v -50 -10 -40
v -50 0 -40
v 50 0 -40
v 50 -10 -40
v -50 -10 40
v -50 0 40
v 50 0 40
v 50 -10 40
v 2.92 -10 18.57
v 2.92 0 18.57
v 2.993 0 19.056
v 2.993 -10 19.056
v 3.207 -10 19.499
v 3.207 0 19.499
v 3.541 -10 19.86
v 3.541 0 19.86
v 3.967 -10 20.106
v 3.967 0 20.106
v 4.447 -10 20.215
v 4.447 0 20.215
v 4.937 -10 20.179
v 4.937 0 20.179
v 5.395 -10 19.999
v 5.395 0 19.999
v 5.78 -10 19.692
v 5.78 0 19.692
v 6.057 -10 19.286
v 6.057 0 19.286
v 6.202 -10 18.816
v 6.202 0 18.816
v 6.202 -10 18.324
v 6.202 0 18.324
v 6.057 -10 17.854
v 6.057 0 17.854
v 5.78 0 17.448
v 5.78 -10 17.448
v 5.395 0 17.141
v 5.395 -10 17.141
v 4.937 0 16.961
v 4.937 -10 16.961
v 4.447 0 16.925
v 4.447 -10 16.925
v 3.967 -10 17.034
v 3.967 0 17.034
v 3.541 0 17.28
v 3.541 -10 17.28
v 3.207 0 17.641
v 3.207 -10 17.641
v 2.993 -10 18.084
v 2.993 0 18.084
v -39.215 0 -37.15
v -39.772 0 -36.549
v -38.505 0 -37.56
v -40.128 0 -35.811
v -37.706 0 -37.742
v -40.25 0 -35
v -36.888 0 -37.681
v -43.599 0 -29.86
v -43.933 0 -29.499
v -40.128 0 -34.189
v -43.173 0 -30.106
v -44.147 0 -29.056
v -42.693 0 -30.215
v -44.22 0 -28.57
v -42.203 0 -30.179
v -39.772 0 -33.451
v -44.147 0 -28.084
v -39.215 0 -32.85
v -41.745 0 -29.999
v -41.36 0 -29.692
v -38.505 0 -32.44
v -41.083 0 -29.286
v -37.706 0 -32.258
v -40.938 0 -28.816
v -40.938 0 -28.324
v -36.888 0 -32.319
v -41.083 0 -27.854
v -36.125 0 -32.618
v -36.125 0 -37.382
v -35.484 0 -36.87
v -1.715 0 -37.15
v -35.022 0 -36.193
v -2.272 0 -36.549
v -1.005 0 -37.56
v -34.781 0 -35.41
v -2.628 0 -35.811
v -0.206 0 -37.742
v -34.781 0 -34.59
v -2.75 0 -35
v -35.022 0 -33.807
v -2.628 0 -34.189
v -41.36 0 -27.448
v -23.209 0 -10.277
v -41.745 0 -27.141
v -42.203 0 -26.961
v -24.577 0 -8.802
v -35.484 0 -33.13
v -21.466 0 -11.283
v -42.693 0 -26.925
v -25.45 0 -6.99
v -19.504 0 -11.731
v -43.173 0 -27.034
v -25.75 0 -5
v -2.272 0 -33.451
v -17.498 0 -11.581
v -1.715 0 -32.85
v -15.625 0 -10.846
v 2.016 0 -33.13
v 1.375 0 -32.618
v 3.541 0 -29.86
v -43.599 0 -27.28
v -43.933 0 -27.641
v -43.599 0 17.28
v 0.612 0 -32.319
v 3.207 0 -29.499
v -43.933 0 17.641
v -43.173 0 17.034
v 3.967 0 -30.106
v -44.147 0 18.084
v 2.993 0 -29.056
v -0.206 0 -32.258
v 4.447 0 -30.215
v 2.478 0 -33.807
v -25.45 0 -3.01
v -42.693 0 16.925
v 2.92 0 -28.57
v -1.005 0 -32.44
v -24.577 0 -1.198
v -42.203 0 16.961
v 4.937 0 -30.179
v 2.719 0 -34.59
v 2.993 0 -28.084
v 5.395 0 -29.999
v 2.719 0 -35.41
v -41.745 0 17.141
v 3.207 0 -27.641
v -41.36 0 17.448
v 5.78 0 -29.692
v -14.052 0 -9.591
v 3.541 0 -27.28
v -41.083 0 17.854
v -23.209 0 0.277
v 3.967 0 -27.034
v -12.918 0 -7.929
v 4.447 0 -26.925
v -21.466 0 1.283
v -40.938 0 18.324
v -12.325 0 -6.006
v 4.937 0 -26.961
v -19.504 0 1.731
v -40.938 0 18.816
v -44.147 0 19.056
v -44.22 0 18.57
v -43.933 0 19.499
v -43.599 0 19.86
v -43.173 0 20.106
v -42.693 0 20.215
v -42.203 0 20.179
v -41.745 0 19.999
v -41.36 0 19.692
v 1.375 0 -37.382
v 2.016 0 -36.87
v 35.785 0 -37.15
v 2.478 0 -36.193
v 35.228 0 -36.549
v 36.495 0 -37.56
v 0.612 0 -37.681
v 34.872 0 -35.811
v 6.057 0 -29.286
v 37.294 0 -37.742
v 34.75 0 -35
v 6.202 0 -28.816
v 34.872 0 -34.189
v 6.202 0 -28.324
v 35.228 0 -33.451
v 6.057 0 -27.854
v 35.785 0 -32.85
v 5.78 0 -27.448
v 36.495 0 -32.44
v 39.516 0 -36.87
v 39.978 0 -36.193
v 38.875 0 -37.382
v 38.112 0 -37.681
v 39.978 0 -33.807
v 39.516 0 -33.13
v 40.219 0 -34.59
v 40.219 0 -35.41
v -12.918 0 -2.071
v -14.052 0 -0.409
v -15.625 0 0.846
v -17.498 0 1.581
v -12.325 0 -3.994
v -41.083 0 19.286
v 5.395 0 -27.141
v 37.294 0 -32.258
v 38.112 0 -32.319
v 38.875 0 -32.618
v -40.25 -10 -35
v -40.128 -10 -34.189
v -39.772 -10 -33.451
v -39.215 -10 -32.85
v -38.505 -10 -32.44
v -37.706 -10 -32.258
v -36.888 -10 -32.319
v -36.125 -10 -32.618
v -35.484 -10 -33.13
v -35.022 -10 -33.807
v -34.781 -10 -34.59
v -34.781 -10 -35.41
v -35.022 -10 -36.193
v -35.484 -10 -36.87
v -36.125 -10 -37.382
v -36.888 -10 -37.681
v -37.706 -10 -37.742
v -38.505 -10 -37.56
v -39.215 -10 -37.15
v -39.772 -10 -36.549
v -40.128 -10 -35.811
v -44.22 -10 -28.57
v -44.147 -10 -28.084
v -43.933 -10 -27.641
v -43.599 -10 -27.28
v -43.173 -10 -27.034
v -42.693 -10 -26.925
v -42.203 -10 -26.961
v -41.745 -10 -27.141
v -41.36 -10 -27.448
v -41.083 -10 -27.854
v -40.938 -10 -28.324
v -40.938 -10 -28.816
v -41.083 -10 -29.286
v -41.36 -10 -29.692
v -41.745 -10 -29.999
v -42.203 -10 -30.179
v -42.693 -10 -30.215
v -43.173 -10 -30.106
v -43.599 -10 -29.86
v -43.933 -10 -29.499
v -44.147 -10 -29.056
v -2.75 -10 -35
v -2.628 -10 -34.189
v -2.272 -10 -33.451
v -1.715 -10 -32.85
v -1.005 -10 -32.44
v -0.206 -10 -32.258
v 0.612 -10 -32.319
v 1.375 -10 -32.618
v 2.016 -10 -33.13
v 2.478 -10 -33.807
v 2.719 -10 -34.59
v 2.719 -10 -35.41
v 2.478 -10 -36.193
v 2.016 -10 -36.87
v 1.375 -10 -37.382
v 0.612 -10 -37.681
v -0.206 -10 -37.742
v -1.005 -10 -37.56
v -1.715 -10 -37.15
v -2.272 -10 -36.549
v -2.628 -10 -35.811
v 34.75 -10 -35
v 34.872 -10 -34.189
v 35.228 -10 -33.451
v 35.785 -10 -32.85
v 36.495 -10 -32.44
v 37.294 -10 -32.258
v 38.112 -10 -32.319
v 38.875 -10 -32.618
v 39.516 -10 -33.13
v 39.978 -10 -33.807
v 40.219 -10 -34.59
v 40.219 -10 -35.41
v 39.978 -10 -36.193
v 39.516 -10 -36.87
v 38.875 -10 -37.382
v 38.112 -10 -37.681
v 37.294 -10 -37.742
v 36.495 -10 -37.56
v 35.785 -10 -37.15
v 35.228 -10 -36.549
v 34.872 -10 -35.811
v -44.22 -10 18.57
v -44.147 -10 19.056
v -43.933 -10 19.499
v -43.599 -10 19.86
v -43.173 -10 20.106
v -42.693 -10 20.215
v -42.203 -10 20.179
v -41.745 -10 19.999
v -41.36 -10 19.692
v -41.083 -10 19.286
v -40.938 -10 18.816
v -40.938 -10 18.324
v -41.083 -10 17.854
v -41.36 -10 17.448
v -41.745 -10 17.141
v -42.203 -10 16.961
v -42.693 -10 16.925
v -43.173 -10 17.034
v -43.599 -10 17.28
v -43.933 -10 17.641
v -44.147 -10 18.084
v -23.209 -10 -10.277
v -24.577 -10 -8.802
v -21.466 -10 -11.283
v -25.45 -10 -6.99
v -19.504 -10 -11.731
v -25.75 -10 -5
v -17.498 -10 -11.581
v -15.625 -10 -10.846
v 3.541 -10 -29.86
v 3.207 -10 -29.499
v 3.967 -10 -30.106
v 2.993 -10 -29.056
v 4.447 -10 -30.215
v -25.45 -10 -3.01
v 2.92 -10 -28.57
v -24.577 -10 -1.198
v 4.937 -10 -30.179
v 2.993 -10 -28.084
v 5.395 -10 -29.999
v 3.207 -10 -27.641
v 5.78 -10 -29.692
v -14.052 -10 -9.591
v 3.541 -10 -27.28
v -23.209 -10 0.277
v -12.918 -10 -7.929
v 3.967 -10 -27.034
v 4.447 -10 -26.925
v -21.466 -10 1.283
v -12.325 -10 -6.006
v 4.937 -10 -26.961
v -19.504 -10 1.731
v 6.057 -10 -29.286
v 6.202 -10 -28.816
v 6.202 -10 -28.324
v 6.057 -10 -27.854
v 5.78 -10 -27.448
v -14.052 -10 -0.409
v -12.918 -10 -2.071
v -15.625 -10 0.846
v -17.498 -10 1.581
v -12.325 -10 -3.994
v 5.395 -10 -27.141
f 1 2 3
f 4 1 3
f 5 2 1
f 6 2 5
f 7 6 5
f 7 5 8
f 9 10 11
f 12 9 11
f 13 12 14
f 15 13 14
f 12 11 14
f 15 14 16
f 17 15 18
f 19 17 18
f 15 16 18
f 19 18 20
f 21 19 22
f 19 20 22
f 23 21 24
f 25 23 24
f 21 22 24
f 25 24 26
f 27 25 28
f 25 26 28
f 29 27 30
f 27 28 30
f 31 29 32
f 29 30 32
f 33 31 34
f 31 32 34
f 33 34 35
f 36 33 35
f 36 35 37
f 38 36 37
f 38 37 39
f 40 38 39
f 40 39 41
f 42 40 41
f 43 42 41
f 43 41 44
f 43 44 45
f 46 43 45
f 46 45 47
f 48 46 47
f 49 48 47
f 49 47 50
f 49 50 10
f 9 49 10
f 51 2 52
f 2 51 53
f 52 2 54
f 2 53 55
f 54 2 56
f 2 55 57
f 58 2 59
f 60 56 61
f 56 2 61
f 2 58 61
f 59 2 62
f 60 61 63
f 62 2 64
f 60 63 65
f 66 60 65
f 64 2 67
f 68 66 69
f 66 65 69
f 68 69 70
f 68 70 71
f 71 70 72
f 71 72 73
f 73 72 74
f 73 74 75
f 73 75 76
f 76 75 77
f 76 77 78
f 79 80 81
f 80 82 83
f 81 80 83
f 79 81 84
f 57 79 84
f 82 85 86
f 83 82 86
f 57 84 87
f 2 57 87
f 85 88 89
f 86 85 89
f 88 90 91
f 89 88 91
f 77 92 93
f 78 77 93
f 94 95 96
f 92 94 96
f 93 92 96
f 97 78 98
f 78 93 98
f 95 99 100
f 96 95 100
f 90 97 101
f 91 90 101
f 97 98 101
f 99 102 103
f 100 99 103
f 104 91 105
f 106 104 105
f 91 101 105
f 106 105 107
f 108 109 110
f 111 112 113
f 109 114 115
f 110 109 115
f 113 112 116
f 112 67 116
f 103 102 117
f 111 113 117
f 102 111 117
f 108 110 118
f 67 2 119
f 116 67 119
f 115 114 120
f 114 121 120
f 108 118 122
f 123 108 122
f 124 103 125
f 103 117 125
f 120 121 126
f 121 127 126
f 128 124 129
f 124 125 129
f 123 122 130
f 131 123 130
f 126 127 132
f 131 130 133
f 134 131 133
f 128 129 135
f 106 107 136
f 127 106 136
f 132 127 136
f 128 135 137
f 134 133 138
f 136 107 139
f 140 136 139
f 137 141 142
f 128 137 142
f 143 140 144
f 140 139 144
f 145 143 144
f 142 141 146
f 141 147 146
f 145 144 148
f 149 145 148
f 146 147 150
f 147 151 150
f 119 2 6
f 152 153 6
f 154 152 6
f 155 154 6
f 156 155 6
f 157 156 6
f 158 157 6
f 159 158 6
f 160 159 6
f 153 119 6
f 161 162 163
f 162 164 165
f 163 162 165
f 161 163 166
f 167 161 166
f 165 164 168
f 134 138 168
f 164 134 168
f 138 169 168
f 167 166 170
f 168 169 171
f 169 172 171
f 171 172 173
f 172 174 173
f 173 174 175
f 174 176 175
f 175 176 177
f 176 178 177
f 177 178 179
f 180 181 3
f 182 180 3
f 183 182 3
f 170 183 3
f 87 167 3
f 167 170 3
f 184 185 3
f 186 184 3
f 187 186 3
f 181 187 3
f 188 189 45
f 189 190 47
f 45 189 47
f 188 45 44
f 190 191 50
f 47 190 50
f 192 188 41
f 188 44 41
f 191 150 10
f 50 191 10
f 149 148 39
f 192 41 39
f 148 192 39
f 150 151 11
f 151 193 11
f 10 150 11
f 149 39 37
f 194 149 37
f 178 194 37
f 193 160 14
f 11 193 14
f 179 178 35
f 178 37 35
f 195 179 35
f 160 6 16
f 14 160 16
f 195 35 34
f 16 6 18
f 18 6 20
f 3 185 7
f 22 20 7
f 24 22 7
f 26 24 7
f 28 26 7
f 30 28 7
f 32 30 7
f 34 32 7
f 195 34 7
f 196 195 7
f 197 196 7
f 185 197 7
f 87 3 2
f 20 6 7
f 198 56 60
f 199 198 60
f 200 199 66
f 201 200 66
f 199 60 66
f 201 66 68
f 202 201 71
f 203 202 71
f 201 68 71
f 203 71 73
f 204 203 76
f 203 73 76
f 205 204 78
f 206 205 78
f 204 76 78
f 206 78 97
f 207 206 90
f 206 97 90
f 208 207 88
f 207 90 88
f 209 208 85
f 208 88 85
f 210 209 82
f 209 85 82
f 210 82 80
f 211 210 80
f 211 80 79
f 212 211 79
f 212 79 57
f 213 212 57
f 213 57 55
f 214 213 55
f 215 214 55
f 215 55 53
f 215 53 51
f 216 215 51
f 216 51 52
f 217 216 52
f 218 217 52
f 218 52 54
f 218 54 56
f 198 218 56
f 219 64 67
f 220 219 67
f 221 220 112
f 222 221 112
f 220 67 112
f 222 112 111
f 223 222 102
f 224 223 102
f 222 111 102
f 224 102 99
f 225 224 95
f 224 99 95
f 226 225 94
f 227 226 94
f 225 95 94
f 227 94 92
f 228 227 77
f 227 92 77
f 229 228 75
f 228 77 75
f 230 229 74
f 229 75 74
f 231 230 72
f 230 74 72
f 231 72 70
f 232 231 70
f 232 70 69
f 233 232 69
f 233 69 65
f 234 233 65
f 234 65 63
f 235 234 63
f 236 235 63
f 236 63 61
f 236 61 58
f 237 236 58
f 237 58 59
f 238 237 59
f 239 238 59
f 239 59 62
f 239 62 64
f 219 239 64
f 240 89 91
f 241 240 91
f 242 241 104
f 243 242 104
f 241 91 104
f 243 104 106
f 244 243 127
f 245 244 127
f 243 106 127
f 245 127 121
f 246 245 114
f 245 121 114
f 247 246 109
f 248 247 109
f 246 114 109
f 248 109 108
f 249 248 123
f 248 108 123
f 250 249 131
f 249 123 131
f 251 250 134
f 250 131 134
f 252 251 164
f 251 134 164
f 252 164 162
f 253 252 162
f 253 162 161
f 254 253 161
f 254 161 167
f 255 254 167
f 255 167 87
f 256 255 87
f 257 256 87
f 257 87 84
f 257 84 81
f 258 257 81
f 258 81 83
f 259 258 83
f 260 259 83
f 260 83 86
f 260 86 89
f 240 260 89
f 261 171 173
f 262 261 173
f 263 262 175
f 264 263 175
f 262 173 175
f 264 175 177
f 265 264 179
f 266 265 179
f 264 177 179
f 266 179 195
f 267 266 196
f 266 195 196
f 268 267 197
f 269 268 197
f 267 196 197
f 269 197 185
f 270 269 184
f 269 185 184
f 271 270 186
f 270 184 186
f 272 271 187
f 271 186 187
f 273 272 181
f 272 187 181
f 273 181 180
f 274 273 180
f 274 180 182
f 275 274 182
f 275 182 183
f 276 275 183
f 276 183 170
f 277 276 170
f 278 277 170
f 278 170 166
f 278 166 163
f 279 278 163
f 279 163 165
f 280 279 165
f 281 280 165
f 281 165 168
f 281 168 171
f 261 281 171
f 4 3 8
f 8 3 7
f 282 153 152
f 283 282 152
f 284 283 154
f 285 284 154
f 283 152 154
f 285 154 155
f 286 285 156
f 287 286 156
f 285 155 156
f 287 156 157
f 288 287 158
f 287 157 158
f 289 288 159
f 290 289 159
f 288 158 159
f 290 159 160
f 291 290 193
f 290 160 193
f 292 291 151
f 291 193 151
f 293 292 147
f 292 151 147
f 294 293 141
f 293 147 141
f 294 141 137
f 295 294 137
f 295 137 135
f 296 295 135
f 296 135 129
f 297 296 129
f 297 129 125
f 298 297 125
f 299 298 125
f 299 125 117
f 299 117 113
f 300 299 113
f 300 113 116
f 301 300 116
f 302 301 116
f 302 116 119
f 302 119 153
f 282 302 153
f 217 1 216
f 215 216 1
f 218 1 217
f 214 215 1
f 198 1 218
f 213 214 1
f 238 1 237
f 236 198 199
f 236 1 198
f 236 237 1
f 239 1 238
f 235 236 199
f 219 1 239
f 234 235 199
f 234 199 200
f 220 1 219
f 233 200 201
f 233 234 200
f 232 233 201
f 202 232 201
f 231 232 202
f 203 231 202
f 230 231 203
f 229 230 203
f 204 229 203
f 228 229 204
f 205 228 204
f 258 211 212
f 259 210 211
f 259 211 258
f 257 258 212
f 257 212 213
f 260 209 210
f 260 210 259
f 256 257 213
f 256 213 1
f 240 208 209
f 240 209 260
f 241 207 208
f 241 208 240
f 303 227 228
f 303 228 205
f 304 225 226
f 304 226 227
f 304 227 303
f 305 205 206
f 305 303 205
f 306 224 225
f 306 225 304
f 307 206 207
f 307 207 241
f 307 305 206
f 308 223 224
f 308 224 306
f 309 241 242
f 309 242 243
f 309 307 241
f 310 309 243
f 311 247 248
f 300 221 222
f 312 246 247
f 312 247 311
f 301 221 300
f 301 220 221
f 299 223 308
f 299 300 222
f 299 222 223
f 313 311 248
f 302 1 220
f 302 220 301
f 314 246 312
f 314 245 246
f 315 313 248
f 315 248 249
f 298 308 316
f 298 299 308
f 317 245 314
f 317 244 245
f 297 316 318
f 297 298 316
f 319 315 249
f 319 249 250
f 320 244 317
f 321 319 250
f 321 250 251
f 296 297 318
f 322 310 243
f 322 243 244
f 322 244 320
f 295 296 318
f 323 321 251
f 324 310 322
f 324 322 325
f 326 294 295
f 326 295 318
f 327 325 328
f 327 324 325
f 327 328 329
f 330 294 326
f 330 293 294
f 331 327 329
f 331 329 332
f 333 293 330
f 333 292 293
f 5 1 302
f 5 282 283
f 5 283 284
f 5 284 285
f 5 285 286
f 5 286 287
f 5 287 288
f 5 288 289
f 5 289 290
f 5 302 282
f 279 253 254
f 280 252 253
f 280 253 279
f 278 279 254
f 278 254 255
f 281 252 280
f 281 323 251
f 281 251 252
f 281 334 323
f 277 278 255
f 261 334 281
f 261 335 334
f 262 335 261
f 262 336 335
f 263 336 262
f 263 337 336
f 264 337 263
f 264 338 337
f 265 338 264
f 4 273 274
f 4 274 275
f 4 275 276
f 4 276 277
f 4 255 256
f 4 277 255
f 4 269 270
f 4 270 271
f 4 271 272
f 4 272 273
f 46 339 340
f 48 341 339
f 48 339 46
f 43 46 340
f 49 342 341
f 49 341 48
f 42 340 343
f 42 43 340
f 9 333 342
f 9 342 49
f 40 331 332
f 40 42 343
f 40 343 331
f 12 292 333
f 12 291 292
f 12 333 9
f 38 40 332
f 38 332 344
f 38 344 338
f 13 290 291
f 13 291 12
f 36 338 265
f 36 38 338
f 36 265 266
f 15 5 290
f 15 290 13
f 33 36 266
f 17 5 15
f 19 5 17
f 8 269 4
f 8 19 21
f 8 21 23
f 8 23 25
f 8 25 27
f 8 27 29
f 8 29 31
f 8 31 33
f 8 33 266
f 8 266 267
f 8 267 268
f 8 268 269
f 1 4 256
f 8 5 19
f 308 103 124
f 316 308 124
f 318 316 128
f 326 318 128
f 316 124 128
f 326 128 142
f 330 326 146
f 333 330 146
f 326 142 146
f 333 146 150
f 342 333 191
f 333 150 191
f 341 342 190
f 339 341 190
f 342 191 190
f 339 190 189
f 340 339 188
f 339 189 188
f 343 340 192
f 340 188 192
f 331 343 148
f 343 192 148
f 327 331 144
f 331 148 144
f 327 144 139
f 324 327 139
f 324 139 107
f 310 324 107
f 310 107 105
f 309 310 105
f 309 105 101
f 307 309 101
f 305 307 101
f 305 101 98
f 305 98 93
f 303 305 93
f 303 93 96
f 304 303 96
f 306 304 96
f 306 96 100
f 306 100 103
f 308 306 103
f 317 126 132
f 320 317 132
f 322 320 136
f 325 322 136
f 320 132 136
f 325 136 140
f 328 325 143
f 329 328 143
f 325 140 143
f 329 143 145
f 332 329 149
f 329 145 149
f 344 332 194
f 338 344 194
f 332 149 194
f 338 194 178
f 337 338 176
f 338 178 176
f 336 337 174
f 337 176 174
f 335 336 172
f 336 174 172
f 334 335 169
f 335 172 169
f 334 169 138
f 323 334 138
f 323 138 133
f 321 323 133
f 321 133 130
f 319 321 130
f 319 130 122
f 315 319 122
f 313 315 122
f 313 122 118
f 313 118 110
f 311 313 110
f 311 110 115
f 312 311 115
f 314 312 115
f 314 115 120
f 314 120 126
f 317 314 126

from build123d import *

# Parameters (mm, degrees)
F0_W     = 100
F0_H     = 80
F1_DEPTH = 10
F3_D     = 3.3
F4_D     = 13.5
F5_D     = 5.5
F5_DEPTH = 14.4
F5_TIP   = 1.6523667023


with BuildPart() as f1:
    # F0 (on Front) → F1 (new body)
    with BuildSketch(Plane.XZ):
        Rectangle(F0_W, F0_H)
    extrude(amount=F1_DEPTH)

    # F3 (through all)
    with Locations(Plane.XZ.offset(10)):
        with Locations((-42.57, 18.57), (4.57, 18.57), (-42.57, -28.57), (4.57, -28.57)):
            Hole(F3_D / 2)

    # F4 (through all)
    with Locations(Plane.XZ.offset(10)):
        with Locations((-19, -5)):
            Hole(F4_D / 2)

    # F5
    with Locations(Plane.XZ.offset(10)):
        with Locations((-37.5, -35), (0, -35), (37.5, -35)):
            Hole(F5_D / 2, depth=F5_DEPTH)
            with Locations((0, 0, -(F5_DEPTH + F5_TIP / 2))):  # 118° drill point
                Cone(0, F5_D / 2, F5_TIP, mode=Mode.SUBTRACT)


solid = f1.part
